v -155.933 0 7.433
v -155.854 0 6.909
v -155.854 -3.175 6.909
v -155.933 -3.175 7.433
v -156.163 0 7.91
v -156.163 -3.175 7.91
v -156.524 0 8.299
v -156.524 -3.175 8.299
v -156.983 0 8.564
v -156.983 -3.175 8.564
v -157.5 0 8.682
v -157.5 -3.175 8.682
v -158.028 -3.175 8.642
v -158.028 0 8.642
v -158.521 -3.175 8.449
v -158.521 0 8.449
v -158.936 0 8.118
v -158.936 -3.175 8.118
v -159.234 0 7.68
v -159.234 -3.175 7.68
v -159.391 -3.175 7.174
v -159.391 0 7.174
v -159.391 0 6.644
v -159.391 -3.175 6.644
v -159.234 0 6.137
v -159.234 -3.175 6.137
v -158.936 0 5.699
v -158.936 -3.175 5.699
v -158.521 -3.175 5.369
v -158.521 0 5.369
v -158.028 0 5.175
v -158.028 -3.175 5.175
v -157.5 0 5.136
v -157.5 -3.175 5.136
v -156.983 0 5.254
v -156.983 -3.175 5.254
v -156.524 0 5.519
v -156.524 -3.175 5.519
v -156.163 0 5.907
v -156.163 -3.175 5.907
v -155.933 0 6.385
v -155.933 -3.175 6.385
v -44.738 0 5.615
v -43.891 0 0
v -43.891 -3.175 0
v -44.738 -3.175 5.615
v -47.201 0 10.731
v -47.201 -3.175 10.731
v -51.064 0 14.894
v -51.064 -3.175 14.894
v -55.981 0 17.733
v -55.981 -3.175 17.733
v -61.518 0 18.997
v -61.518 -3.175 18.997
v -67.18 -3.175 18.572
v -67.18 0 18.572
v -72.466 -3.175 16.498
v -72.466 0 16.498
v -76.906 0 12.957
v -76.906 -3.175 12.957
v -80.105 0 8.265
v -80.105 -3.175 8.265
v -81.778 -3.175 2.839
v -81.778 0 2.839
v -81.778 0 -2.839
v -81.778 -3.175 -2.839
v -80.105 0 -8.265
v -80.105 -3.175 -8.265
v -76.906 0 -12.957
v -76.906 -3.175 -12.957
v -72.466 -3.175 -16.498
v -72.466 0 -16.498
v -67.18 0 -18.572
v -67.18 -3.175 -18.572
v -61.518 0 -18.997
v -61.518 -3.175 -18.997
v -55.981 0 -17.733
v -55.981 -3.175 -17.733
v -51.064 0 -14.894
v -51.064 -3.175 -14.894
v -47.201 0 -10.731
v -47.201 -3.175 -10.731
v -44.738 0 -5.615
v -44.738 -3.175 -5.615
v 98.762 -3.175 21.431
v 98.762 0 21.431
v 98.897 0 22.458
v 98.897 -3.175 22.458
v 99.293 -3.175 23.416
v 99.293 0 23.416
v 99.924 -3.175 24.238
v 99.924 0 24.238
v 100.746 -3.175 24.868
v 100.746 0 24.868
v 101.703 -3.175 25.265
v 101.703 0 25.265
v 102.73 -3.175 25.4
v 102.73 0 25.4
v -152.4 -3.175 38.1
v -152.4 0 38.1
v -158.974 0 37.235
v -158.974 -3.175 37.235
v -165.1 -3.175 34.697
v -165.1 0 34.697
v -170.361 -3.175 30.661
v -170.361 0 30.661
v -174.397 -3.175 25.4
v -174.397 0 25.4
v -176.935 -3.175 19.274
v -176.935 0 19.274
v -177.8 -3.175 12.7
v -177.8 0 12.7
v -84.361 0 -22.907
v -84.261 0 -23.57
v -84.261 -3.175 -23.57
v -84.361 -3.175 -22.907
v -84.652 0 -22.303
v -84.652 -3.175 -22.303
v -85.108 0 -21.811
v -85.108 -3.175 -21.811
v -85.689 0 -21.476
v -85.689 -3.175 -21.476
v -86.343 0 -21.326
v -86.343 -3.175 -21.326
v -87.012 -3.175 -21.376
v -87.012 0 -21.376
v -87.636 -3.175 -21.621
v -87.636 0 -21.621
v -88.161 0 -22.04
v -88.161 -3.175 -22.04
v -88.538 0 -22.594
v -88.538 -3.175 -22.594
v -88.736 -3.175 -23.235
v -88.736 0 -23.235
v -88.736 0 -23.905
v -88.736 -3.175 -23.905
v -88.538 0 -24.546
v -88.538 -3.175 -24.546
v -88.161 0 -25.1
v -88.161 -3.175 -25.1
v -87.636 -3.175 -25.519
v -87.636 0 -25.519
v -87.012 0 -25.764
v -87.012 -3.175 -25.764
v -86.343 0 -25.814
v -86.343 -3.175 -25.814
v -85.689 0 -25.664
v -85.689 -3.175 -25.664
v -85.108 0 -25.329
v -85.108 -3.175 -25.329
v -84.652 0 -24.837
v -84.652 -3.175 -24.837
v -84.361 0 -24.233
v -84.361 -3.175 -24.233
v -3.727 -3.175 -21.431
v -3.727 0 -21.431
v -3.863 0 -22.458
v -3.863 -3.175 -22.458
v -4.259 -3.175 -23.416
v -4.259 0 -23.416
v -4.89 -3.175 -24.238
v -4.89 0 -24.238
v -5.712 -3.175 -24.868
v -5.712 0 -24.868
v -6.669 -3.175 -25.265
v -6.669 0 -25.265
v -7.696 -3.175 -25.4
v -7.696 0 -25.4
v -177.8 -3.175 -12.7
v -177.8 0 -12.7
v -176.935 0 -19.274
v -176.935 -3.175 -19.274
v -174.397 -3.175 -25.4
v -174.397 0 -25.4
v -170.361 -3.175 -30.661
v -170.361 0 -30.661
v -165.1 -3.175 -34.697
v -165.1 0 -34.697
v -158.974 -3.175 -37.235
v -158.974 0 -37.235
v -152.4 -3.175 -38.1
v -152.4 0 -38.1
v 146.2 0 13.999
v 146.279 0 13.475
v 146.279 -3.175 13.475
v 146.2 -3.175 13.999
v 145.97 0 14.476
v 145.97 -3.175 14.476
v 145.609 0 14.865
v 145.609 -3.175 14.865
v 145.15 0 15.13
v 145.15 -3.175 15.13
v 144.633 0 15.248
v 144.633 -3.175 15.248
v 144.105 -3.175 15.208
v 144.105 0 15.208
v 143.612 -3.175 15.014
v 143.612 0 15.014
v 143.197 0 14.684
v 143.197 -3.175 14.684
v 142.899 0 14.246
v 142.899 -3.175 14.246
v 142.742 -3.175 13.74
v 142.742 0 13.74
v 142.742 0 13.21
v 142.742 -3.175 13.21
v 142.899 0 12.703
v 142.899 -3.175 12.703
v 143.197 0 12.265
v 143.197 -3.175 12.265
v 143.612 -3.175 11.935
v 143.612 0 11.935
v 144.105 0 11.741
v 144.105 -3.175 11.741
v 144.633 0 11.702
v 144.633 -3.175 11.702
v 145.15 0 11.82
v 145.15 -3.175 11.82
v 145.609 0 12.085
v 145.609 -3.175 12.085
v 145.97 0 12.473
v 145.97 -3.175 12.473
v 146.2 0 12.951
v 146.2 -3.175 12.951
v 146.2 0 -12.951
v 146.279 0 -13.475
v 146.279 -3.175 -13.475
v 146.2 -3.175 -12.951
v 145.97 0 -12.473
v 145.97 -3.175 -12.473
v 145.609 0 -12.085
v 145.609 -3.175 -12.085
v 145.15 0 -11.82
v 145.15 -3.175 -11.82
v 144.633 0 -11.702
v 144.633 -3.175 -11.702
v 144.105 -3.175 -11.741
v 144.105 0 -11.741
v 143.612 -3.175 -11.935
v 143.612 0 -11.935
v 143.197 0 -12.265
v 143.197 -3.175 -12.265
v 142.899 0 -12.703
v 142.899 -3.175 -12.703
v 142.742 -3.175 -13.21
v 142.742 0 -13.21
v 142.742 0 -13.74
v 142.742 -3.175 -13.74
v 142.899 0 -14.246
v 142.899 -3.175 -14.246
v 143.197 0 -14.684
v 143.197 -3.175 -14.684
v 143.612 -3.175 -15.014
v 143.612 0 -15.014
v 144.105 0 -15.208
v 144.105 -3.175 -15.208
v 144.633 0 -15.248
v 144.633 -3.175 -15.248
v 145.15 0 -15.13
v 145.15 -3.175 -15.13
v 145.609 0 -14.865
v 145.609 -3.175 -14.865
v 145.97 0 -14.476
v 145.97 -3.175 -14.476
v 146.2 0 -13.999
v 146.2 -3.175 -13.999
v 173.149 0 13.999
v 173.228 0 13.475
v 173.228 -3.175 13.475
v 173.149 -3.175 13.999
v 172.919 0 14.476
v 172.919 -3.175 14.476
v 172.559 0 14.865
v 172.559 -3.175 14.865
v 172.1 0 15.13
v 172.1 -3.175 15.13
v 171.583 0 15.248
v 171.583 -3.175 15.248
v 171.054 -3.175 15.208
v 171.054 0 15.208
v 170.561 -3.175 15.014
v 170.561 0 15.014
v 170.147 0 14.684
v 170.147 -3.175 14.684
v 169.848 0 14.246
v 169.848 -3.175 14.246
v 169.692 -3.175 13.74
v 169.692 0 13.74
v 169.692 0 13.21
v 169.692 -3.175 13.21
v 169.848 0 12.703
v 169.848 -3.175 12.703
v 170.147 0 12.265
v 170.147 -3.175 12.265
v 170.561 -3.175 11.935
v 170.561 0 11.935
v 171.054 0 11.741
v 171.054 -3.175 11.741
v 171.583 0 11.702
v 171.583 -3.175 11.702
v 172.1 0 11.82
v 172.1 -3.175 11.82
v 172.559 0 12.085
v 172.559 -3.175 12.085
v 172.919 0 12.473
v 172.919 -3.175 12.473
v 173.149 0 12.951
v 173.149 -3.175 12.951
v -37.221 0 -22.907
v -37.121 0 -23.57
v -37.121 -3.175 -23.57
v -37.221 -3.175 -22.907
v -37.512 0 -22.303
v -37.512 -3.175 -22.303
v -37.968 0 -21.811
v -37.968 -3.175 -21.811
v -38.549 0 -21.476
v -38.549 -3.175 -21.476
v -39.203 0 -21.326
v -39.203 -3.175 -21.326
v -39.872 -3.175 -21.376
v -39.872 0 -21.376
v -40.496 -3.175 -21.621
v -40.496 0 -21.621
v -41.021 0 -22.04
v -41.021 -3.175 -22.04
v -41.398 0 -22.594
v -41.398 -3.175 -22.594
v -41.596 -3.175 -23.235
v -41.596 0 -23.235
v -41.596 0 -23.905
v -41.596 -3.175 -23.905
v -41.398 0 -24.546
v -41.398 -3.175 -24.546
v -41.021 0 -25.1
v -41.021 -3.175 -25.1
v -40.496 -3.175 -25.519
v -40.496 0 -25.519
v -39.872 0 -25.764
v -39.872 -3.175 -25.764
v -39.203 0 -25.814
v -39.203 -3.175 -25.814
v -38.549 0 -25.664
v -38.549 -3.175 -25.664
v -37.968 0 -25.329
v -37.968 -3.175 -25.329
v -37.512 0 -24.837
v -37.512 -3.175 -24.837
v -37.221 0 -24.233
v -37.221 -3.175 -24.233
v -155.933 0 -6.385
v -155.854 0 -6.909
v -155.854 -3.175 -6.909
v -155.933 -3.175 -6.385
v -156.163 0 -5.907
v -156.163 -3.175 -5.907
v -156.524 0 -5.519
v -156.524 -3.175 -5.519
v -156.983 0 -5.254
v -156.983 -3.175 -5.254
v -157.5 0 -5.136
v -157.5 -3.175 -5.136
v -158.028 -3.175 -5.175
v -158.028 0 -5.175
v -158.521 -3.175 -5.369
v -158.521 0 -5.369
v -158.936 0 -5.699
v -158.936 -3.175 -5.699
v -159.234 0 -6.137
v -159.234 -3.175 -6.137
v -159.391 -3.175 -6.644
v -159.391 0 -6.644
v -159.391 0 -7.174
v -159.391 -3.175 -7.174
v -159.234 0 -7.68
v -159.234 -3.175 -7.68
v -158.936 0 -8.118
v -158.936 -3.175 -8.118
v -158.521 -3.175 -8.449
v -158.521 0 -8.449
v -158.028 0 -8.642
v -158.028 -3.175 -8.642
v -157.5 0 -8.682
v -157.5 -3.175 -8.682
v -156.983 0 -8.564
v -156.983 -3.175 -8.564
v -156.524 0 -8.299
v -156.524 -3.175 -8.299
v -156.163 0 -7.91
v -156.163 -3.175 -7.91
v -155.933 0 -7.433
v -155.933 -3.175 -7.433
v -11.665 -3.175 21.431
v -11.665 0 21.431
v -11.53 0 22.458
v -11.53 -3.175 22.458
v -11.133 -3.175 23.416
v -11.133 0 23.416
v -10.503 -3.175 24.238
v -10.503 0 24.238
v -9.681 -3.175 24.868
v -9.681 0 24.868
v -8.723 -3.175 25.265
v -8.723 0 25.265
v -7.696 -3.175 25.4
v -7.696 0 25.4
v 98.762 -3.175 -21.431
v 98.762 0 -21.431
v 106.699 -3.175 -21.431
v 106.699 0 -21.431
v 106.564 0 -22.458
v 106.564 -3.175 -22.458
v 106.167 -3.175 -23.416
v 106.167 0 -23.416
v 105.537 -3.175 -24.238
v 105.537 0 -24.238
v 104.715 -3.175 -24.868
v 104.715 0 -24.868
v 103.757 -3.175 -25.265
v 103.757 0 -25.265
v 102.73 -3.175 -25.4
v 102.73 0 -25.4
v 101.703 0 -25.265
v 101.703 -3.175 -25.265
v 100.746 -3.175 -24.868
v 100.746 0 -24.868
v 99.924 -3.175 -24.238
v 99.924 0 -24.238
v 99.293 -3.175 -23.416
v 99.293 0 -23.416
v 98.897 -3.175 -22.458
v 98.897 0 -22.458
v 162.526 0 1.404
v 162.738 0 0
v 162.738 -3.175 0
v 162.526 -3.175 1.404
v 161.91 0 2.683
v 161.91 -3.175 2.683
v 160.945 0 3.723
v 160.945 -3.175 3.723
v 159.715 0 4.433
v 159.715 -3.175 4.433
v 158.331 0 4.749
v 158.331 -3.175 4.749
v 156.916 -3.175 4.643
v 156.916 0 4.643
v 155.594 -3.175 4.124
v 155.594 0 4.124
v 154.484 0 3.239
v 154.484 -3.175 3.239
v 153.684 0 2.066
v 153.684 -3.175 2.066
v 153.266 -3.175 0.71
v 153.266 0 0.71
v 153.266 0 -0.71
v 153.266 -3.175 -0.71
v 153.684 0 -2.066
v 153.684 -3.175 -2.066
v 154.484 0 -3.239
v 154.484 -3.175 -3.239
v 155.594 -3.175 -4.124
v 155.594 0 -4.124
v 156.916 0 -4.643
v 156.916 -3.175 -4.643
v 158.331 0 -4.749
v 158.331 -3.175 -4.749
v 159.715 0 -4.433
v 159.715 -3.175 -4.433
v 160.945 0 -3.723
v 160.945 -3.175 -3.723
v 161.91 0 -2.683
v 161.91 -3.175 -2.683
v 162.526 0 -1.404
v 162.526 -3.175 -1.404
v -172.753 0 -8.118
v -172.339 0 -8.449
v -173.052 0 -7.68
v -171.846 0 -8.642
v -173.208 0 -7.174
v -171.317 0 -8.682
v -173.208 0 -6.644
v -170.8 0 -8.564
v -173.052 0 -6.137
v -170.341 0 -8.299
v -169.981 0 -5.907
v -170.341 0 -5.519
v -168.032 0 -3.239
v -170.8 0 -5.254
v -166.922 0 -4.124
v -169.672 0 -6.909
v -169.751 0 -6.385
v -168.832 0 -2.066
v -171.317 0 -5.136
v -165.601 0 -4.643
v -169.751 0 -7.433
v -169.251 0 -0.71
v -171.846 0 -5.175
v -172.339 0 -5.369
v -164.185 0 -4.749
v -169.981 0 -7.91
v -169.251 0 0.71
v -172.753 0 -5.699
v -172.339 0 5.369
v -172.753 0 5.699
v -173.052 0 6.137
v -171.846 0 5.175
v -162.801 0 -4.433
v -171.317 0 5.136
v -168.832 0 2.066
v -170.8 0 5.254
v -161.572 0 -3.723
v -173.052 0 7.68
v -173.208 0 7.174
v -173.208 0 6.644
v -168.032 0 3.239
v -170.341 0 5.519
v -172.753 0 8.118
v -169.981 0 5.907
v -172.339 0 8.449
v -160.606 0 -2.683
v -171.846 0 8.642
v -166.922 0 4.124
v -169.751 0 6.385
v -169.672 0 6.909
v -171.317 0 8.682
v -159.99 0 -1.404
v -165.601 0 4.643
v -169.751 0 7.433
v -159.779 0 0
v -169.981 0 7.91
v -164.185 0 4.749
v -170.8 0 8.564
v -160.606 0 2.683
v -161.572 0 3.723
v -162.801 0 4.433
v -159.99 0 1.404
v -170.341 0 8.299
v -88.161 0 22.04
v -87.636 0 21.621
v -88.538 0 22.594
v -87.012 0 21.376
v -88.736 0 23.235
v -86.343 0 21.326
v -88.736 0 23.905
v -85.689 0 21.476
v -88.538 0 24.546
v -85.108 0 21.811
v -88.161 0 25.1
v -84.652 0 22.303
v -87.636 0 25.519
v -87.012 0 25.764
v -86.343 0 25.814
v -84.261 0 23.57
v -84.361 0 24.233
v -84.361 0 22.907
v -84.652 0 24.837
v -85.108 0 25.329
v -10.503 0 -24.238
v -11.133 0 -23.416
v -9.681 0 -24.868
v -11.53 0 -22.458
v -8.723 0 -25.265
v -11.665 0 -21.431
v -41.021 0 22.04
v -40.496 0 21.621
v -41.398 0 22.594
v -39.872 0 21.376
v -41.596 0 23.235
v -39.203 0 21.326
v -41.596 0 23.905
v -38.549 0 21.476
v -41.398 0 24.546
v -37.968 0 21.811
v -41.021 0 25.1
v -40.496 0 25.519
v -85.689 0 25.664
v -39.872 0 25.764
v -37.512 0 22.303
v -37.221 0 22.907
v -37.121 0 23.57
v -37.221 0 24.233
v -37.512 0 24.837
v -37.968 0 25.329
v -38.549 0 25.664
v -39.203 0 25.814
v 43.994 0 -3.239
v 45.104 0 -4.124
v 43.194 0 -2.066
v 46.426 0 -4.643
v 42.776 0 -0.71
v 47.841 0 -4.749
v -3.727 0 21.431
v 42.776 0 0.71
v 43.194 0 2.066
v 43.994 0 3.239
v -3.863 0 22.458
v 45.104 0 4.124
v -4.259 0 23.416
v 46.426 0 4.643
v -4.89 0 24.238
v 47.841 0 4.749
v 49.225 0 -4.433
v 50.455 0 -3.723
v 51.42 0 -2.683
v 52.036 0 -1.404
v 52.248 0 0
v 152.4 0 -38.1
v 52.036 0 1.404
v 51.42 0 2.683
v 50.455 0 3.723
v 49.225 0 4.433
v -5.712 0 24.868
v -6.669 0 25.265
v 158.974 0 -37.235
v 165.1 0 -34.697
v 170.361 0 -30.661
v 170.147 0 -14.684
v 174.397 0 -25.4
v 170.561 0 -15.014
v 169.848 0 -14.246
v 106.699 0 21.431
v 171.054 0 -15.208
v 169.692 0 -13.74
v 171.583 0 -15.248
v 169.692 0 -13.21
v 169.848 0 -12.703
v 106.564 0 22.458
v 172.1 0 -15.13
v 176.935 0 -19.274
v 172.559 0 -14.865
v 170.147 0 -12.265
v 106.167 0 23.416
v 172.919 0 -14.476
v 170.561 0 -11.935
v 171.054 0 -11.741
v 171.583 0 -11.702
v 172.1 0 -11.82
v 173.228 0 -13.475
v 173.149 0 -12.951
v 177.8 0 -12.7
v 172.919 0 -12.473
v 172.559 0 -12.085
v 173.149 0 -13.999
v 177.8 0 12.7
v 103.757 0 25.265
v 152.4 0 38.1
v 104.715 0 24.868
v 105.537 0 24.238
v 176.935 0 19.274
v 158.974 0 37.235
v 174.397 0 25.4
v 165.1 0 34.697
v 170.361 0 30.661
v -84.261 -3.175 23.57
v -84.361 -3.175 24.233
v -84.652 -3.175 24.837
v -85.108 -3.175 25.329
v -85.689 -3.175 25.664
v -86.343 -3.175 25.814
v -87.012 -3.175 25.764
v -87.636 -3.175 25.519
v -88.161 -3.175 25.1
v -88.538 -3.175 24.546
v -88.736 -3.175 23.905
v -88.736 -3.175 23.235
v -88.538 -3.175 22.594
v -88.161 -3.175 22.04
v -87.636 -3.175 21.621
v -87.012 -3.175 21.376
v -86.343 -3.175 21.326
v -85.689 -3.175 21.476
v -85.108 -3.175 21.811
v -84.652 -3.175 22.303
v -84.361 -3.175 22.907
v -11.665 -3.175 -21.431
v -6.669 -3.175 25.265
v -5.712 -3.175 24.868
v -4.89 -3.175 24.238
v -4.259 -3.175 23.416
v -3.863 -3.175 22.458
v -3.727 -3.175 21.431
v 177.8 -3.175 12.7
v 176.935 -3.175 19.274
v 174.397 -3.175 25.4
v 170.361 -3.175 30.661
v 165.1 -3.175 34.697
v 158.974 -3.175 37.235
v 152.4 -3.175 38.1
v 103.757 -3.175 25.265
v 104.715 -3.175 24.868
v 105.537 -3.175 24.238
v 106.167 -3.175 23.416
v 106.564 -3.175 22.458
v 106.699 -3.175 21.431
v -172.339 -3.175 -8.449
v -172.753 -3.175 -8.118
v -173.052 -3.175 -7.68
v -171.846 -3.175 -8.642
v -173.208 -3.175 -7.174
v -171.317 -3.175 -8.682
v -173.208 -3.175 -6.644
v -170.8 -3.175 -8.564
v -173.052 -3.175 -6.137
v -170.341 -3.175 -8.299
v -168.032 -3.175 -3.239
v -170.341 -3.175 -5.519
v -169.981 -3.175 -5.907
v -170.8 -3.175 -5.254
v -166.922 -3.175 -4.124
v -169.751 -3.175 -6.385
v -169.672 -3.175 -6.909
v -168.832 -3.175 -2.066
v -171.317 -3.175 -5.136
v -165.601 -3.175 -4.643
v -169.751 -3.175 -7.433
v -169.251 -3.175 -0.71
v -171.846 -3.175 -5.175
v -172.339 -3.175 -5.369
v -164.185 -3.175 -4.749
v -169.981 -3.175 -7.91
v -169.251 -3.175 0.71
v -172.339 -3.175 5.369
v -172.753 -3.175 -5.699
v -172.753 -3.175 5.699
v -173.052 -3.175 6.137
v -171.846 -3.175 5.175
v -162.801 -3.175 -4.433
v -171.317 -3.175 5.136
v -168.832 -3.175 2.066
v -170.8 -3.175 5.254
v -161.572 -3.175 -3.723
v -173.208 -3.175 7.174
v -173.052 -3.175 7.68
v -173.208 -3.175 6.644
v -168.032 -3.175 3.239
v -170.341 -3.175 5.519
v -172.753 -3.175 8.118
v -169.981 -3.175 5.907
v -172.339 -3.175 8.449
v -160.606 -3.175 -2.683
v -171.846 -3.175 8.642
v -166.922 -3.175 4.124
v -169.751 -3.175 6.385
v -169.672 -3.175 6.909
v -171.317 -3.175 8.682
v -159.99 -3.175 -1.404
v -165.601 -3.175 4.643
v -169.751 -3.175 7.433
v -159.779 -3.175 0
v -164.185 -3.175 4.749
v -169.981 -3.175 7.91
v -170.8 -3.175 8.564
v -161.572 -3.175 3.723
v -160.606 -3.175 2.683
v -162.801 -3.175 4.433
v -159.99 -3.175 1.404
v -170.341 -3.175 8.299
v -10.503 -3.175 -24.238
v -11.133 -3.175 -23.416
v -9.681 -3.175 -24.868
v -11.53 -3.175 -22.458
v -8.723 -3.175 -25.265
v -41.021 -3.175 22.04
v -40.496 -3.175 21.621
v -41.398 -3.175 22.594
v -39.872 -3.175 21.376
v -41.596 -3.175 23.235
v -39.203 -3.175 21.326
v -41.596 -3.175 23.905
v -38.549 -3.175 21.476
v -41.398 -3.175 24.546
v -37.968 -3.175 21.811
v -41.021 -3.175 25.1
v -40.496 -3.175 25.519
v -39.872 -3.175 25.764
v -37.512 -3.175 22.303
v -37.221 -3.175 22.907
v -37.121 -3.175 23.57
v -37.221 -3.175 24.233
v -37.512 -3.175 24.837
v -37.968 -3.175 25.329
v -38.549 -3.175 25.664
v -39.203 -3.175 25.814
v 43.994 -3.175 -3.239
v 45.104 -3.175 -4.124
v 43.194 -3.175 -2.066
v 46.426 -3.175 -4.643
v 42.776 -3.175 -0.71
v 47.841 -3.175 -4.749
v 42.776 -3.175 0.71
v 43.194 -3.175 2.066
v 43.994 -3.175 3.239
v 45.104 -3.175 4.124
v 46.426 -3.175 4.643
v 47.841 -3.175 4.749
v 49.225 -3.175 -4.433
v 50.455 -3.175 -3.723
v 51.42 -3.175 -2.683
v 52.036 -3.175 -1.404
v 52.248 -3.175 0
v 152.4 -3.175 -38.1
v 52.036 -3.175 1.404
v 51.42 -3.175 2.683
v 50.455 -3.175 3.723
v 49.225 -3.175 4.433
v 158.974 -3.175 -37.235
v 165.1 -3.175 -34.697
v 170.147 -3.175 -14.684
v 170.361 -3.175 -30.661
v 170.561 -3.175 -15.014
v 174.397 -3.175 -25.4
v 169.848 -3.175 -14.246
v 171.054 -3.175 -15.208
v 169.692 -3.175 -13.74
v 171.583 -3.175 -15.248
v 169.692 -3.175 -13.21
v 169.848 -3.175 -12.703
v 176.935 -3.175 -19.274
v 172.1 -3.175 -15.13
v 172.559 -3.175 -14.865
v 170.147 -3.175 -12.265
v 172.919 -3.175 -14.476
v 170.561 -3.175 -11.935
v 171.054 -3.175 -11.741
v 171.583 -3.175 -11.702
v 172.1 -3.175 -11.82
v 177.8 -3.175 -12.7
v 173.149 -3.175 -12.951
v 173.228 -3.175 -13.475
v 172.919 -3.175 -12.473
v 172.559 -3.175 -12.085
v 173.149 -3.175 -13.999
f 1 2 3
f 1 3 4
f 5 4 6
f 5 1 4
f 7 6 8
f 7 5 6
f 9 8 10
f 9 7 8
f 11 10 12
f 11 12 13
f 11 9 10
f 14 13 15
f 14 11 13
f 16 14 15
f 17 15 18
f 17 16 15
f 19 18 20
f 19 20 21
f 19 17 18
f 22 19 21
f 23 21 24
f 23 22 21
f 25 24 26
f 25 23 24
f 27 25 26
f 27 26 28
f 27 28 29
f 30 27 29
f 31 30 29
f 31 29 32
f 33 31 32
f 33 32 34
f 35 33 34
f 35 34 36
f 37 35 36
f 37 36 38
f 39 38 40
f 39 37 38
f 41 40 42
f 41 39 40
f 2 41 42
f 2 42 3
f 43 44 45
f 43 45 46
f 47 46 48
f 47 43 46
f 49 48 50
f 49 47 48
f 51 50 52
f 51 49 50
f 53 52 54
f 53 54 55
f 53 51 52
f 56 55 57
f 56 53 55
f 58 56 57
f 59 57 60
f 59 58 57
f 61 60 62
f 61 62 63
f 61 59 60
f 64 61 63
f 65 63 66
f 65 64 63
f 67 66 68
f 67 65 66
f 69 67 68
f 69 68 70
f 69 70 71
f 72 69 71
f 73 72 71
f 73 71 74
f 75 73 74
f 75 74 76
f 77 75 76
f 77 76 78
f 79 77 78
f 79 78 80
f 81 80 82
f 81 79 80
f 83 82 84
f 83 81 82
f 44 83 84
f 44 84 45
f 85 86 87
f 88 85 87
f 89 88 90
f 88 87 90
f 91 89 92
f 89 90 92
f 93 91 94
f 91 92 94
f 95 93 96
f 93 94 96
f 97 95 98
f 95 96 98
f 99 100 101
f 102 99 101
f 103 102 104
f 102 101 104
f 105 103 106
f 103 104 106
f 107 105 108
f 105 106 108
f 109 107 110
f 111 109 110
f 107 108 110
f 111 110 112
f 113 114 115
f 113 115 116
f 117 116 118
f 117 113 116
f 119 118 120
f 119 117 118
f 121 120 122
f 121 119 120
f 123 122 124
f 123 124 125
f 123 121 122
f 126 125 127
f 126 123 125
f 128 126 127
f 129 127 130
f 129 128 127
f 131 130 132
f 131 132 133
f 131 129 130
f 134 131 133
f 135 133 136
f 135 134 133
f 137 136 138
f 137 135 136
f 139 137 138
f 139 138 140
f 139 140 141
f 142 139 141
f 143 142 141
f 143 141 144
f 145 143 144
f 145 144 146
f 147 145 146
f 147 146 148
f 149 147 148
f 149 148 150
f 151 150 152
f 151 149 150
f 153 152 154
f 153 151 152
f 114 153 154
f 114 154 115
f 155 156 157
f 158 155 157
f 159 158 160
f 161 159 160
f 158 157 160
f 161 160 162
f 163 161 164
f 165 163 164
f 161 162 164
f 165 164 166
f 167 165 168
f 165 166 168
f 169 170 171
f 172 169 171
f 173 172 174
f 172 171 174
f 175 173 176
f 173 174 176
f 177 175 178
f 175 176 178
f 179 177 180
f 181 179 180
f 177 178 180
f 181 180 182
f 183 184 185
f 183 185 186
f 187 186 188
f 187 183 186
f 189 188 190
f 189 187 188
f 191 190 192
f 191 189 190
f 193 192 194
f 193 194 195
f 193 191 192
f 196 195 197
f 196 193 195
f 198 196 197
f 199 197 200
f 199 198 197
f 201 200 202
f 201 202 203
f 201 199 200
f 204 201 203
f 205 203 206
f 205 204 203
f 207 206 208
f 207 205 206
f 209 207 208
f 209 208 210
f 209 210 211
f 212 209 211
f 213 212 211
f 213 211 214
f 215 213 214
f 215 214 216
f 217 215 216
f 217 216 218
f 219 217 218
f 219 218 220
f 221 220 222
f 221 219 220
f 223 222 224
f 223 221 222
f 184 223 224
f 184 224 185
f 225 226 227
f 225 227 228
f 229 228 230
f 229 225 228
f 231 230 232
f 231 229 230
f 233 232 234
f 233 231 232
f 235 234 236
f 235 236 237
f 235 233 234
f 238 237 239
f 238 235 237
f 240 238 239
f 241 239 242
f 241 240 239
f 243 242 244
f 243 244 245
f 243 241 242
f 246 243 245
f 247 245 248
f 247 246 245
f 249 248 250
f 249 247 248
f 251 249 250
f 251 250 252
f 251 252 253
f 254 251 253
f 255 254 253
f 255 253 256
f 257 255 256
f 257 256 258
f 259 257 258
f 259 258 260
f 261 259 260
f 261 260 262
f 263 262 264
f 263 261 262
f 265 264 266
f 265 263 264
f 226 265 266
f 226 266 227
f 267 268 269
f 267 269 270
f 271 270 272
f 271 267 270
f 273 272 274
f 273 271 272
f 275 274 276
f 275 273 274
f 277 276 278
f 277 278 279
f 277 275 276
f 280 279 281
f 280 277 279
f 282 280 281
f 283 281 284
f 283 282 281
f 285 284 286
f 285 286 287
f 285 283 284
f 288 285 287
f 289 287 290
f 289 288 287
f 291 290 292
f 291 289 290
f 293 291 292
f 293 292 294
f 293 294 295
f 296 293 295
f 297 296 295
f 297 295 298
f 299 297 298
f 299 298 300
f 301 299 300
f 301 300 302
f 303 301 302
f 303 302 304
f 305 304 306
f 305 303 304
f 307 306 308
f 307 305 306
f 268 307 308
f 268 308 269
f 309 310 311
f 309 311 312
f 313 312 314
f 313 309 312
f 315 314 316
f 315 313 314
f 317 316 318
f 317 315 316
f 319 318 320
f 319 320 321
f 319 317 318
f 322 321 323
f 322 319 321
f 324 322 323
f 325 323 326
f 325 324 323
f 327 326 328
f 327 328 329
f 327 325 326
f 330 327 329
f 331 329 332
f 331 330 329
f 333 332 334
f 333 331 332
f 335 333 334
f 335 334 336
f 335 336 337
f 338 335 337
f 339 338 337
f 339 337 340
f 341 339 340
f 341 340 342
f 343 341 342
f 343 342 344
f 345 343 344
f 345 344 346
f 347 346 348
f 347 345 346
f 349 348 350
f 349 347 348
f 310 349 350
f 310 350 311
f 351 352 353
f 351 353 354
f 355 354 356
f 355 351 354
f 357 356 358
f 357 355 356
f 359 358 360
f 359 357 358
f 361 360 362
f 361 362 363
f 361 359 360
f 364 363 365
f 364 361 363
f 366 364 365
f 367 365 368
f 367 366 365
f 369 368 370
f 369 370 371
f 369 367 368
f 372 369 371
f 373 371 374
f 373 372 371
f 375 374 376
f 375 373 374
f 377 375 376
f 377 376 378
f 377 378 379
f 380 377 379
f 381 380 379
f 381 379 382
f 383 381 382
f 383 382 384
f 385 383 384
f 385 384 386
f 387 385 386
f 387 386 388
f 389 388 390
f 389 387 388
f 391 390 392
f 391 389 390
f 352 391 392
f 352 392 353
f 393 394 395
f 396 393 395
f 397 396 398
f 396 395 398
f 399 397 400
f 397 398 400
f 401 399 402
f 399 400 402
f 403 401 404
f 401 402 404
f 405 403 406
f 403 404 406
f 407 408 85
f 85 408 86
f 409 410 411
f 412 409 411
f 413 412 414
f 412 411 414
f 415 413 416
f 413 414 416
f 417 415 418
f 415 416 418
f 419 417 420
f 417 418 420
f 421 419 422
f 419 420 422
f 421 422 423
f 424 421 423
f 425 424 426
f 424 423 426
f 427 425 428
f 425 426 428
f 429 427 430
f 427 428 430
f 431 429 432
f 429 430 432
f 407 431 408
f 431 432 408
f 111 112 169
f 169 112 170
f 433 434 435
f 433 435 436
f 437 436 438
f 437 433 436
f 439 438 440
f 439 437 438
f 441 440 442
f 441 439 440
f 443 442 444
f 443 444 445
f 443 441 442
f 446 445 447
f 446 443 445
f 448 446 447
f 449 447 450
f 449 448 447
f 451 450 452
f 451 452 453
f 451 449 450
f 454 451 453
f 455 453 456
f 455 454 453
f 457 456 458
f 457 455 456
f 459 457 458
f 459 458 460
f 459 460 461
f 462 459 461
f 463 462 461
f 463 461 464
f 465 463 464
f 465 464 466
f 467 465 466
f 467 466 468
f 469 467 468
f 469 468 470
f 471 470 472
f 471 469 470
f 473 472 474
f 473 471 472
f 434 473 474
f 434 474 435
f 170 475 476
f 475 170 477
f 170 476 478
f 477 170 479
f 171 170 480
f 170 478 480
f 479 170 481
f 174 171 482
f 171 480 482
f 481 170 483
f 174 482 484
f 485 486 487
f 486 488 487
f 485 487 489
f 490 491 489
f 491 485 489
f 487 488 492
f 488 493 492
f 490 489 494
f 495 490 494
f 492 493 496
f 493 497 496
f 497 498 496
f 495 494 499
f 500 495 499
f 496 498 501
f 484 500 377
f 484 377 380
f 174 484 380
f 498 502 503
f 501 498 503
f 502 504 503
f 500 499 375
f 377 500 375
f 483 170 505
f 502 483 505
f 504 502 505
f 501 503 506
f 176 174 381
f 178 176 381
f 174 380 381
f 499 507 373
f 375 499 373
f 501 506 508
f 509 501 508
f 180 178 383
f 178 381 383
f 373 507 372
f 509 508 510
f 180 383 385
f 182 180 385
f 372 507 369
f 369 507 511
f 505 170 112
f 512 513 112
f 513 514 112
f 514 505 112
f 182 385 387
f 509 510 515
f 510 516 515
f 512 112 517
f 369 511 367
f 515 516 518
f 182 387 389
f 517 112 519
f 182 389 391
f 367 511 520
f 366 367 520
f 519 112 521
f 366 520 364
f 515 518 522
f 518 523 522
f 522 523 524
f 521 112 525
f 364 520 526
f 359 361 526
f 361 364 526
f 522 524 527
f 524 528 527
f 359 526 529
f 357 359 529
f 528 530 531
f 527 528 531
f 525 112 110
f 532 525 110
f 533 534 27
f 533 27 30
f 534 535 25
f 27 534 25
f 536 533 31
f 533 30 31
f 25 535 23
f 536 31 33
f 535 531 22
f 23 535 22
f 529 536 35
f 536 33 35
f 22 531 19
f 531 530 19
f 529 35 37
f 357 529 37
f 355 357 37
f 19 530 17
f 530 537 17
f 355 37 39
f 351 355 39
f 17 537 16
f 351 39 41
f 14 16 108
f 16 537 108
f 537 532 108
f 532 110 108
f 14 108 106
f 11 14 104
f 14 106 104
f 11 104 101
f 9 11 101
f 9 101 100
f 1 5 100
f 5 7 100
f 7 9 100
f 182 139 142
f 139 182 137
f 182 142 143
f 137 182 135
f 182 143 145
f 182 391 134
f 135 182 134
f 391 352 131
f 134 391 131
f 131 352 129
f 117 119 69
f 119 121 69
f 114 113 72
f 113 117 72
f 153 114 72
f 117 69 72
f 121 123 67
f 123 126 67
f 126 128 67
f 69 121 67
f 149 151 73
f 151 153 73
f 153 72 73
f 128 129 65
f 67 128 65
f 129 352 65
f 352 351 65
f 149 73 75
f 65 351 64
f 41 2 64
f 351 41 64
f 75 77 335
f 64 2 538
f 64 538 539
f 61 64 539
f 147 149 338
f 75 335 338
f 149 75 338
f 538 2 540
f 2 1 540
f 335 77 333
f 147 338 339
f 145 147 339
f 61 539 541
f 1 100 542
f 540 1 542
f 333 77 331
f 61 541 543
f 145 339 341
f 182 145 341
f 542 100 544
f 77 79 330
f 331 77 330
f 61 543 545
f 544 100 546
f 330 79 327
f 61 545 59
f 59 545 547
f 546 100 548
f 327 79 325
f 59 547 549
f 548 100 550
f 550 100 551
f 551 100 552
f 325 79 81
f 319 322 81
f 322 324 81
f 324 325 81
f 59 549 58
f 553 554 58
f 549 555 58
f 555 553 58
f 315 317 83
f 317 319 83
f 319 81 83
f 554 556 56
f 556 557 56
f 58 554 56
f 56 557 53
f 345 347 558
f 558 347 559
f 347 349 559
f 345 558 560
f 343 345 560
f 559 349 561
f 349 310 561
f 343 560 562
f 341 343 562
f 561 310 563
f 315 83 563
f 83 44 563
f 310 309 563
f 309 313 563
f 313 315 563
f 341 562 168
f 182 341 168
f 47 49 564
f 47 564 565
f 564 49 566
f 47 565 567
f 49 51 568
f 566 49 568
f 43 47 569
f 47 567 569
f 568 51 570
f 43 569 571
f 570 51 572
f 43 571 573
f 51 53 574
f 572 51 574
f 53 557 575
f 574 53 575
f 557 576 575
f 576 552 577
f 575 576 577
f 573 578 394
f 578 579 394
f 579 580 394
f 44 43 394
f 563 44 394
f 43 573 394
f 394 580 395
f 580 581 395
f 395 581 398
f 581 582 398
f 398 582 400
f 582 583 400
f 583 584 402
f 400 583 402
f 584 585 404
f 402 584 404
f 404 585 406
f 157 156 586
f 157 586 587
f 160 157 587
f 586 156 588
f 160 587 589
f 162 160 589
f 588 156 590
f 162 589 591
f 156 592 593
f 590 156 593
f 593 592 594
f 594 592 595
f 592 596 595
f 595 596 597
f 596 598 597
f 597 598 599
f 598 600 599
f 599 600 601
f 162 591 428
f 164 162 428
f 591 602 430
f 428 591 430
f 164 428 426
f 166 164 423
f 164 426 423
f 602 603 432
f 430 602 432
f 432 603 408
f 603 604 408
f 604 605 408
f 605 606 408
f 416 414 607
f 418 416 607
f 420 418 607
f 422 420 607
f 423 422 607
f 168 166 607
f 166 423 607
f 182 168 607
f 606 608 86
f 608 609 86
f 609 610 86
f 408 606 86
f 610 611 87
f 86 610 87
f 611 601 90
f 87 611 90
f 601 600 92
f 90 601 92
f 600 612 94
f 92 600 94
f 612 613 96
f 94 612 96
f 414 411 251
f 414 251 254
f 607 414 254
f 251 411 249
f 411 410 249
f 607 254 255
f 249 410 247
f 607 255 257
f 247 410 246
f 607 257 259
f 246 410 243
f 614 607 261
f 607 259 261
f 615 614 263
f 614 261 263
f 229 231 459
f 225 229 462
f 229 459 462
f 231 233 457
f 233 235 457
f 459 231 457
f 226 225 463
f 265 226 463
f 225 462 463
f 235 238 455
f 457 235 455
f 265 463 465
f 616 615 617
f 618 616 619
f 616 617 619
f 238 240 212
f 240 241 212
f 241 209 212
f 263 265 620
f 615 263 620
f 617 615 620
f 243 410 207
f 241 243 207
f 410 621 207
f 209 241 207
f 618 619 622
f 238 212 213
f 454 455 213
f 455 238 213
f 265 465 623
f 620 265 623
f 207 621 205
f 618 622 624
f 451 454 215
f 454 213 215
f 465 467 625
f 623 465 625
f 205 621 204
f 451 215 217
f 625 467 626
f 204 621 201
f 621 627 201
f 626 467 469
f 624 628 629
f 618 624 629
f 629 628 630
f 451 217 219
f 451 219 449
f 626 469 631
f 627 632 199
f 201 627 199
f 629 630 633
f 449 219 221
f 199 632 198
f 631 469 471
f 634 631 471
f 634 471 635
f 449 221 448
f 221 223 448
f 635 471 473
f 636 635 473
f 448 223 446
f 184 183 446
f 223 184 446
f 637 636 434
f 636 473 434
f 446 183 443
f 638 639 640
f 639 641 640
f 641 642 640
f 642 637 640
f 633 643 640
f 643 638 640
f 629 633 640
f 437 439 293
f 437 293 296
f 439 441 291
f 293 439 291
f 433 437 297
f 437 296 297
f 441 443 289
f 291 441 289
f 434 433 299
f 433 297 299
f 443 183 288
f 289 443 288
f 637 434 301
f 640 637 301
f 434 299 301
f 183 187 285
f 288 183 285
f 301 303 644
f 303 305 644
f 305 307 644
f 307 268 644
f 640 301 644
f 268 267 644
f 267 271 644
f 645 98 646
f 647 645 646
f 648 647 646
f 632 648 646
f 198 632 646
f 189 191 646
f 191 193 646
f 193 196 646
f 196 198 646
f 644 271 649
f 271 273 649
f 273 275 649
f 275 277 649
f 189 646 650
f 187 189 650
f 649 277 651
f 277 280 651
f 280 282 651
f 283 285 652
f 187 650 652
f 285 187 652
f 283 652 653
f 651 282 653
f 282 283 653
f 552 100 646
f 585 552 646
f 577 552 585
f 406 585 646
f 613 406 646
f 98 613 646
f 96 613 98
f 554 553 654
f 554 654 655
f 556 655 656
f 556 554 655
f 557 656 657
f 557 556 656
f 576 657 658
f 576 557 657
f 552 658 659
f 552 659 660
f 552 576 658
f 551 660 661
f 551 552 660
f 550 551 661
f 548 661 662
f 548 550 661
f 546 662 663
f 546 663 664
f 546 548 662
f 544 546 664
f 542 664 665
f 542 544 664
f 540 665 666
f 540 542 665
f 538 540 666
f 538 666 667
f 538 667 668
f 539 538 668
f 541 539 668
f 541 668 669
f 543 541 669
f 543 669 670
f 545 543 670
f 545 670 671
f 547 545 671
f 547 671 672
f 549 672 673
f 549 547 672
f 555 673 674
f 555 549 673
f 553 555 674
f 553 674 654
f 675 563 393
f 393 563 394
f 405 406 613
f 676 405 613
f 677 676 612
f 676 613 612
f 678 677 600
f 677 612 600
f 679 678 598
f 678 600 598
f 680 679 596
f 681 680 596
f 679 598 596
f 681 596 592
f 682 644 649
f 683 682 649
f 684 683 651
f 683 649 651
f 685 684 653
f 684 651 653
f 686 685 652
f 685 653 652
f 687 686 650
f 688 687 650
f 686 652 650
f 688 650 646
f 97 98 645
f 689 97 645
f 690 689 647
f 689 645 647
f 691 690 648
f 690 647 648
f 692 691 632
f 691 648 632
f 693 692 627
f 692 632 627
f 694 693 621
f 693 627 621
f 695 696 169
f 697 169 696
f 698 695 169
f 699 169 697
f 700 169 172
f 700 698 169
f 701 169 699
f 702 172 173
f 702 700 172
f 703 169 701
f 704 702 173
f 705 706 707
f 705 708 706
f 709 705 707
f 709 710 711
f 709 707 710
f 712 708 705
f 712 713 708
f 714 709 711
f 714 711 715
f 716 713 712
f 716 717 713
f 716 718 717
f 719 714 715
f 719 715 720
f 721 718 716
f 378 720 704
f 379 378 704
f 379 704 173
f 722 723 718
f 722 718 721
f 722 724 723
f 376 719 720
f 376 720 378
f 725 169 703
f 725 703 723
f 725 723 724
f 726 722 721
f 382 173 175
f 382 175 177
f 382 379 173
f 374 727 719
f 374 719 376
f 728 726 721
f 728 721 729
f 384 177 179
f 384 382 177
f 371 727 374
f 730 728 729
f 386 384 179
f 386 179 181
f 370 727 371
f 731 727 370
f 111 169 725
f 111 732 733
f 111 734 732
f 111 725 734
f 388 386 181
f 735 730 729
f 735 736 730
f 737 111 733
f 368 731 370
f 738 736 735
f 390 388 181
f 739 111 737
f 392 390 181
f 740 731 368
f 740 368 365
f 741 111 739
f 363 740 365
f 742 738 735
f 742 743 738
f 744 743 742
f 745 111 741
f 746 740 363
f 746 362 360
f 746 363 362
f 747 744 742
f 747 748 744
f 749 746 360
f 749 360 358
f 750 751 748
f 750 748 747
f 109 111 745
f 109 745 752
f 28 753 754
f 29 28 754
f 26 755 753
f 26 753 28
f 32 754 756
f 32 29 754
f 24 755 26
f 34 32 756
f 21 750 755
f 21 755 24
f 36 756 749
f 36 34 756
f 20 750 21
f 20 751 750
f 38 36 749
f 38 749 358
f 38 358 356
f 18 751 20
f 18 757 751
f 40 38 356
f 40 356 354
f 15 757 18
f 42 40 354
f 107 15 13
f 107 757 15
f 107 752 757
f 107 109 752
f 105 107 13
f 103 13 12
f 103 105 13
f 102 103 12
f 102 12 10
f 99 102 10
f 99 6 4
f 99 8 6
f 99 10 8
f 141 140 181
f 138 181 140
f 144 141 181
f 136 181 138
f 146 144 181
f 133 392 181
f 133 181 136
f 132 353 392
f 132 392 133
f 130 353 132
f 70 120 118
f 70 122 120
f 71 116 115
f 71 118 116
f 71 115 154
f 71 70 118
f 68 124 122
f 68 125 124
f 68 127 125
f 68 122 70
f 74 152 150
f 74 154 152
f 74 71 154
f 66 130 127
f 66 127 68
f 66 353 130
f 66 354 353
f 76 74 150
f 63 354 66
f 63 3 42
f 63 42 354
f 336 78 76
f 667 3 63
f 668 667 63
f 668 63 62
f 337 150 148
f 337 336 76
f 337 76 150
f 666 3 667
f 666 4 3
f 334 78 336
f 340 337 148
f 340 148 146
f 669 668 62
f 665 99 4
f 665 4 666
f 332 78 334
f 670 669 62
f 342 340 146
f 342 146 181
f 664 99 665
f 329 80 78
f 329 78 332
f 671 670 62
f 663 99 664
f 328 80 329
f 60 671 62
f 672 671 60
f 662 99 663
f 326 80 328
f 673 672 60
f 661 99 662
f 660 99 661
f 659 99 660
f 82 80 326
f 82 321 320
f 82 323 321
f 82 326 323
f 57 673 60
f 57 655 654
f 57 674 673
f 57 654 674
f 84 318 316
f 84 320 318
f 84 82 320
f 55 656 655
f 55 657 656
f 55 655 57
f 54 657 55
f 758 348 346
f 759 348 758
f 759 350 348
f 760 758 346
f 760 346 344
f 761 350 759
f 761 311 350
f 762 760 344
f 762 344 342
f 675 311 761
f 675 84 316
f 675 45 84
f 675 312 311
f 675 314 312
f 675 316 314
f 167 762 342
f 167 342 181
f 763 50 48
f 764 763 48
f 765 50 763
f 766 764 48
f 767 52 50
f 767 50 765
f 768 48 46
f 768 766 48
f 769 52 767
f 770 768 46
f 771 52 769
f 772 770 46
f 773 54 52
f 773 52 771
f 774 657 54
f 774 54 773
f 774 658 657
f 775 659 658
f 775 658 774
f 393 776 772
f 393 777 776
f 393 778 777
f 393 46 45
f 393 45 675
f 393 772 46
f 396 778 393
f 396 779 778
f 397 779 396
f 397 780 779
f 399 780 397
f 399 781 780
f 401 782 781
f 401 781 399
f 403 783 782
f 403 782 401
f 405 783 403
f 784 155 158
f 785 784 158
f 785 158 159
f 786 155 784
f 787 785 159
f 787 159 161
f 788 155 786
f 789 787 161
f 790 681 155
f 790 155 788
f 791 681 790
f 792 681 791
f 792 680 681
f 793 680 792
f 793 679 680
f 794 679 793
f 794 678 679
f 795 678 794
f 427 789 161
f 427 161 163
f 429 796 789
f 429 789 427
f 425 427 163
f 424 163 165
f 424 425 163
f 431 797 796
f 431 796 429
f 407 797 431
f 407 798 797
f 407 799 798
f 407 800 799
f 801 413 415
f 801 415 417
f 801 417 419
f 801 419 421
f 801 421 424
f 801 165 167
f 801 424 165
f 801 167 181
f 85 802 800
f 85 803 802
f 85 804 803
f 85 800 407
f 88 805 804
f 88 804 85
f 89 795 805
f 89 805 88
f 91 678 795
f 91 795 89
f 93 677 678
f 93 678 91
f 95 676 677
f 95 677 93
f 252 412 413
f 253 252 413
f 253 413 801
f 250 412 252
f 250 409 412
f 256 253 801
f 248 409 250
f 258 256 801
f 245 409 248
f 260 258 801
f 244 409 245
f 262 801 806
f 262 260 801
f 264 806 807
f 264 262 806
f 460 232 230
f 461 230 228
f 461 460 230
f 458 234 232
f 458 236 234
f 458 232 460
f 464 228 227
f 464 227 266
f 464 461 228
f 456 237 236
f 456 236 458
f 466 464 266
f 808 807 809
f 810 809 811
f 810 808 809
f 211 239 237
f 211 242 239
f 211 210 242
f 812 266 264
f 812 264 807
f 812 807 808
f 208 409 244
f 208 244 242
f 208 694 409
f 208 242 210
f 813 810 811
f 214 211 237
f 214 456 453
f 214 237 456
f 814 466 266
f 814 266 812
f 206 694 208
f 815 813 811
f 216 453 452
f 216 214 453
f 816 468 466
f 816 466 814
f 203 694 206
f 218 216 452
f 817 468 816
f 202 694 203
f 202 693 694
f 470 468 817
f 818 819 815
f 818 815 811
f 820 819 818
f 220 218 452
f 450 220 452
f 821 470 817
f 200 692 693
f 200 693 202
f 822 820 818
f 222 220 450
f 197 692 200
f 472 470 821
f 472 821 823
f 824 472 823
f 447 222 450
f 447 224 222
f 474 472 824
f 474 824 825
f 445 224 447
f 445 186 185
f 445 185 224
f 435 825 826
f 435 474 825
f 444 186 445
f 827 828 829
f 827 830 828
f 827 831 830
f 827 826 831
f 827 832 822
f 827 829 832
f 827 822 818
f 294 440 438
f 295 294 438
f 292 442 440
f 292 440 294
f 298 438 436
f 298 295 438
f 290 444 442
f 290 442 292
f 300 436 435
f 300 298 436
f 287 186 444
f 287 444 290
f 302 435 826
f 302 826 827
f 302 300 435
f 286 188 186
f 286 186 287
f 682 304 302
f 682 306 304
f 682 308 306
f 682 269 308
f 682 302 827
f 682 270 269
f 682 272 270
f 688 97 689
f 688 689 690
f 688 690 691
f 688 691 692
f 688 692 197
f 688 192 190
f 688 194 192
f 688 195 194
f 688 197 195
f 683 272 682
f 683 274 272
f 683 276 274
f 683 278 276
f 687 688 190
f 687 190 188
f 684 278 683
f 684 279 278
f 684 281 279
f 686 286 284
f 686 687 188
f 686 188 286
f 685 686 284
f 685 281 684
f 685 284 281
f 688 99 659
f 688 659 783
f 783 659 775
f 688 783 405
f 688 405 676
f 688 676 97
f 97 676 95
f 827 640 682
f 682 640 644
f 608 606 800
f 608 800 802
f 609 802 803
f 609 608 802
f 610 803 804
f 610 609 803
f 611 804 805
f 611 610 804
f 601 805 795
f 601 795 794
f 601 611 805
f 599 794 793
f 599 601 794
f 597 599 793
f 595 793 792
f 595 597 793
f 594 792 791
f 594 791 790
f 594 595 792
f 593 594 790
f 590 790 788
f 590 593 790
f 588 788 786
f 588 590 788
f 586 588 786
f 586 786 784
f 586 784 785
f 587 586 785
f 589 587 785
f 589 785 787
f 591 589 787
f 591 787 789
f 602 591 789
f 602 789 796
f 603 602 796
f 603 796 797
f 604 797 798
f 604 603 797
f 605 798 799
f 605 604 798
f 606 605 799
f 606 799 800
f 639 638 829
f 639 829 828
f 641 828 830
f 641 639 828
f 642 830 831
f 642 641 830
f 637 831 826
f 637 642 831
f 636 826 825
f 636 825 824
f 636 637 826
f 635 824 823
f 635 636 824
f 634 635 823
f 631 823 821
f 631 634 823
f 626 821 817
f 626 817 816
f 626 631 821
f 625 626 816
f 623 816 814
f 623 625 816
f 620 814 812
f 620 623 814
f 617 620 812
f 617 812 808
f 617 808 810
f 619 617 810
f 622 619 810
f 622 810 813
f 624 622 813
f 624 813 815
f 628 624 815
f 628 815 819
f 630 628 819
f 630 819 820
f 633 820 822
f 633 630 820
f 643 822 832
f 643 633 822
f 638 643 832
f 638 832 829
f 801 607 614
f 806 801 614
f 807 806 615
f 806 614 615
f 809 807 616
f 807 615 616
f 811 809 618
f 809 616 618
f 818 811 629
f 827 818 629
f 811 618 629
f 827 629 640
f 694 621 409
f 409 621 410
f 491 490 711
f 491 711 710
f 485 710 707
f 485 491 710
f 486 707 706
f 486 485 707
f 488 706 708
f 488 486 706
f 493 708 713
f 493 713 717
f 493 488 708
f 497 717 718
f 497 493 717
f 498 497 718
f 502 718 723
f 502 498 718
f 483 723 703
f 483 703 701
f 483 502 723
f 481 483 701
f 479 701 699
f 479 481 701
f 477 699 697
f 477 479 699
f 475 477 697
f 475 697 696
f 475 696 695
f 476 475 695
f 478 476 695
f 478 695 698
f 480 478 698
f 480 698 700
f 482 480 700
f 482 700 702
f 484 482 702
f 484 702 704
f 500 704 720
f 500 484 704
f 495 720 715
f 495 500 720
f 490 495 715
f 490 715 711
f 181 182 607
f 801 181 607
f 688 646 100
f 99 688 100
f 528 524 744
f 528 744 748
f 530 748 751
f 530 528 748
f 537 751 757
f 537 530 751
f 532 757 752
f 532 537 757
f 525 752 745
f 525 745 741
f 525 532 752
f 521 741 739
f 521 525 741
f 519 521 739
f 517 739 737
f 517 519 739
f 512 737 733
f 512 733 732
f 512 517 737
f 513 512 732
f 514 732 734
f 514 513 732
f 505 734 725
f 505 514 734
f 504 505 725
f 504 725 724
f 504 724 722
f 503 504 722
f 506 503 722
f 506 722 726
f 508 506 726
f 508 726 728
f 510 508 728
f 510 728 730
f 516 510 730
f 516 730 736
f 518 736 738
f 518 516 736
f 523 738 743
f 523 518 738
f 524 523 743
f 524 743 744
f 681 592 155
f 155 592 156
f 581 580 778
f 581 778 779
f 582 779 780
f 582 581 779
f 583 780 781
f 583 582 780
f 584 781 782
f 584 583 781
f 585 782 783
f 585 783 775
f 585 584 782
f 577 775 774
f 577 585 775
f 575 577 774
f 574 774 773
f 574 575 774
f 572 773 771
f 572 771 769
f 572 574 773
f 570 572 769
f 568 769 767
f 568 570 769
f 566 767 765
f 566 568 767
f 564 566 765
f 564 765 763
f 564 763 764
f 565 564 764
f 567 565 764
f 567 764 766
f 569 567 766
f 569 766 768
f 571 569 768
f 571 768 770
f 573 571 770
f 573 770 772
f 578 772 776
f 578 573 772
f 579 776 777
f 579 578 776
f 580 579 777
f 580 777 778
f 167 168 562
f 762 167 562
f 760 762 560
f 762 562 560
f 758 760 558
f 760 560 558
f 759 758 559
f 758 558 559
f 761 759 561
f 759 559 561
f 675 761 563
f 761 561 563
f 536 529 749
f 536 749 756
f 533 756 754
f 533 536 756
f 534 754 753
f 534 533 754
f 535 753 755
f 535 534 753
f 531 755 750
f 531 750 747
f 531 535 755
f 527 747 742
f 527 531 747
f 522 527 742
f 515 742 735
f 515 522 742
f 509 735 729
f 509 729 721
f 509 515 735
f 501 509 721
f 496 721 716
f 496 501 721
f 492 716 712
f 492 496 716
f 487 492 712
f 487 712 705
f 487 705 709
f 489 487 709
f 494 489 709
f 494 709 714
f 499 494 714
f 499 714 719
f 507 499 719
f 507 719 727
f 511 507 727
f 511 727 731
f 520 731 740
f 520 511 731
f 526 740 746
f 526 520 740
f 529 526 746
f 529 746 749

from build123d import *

# Parameters (mm, degrees)
F0_R     = 2.25
F0_R_2   = 1.778
F0_R_3   = 4.7625
F0_R_4   = 19.05
F1_DEPTH = 3.175


with BuildPart() as f1:
    # F0 (on Front) → F1 (new body)
    with BuildSketch(Plane.XZ):
        with BuildLine():
            ThreePointArc((177.8, 12.7), (170.360512, 30.660512), (152.4, 38.1))
            Line((152.4, 38.1), (-152.4, 38.1))
            ThreePointArc((-152.4, 38.1), (-170.360512, 30.660512), (-177.8, 12.7))
            Line((-177.8, 12.7), (-177.8, -12.7))
            ThreePointArc((-177.8, -12.7), (-170.360512, -30.660512), (-152.4, -38.1))
            Line((-152.4, -38.1), (152.4, -38.1))
            ThreePointArc((152.4, -38.1), (170.360512, -30.660512), (177.8, -12.7))
            Line((177.8, -12.7), (177.8, 12.7))
        make_face()
        with Locations((-86.5112, -23.57)):
            Circle(F0_R, mode=Mode.SUBTRACT)
        with Locations((-39.3712, -23.57)):
            Circle(F0_R, mode=Mode.SUBTRACT)
        with Locations((-171.45, -6.9088)):
            Circle(F0_R_2, mode=Mode.SUBTRACT)
        with Locations((-157.6324, -6.9088)):
            Circle(F0_R_2, mode=Mode.SUBTRACT)
        with Locations((144.5006, -13.4747)):
            Circle(F0_R_2, mode=Mode.SUBTRACT)
        with Locations((171.45, -13.4747)):
            Circle(F0_R_2, mode=Mode.SUBTRACT)
        with Locations((-164.5412, 0)):
            Circle(F0_R_3, mode=Mode.SUBTRACT)
        with Locations((-171.45, 6.9088)):
            Circle(F0_R_2, mode=Mode.SUBTRACT)
        with Locations((-157.6324, 6.9088)):
            Circle(F0_R_2, mode=Mode.SUBTRACT)
        with Locations((-62.9412, 0)):
            Circle(F0_R_4, mode=Mode.SUBTRACT)
        with BuildLine():
            Line((-3.72745, 21.43125), (-3.72745, -21.43125))
            ThreePointArc((-3.72745, -21.43125), (-4.88987, -24.23758), (-7.6962, -25.4))
            ThreePointArc((-7.6962, -25.4), (-10.50253, -24.23758), (-11.66495, -21.43125))
            Line((-11.66495, -21.43125), (-11.66495, 21.43125))
            ThreePointArc((-11.66495, 21.43125), (-10.50253, 24.23758), (-7.6962, 25.4))
            ThreePointArc((-7.6962, 25.4), (-4.88987, 24.23758), (-3.72745, 21.43125))
        make_face(mode=Mode.SUBTRACT)
        with Locations((-86.5112, 23.57)):
            Circle(F0_R, mode=Mode.SUBTRACT)
        with Locations((-39.3712, 23.57)):
            Circle(F0_R, mode=Mode.SUBTRACT)
        with Locations((47.4853, 0)):
            Circle(F0_R_3, mode=Mode.SUBTRACT)
        with BuildLine():
            Line((106.69905, 21.43125), (106.69905, -21.43125))
            ThreePointArc((106.69905, -21.43125), (105.53663, -24.23758), (102.7303, -25.4))
            ThreePointArc((102.7303, -25.4), (99.92397, -24.23758), (98.76155, -21.43125))
            Line((98.76155, -21.43125), (98.76155, 21.43125))
            ThreePointArc((98.76155, 21.43125), (99.92397, 24.23758), (102.7303, 25.4))
            ThreePointArc((102.7303, 25.4), (105.53663, 24.23758), (106.69905, 21.43125))
        make_face(mode=Mode.SUBTRACT)
        with Locations((157.9753, 0)):
            Circle(F0_R_3, mode=Mode.SUBTRACT)
        with Locations((144.5006, 13.4747)):
            Circle(F0_R_2, mode=Mode.SUBTRACT)
        with Locations((171.45, 13.4747)):
            Circle(F0_R_2, mode=Mode.SUBTRACT)
    extrude(amount=F1_DEPTH)


solid = f1.part
